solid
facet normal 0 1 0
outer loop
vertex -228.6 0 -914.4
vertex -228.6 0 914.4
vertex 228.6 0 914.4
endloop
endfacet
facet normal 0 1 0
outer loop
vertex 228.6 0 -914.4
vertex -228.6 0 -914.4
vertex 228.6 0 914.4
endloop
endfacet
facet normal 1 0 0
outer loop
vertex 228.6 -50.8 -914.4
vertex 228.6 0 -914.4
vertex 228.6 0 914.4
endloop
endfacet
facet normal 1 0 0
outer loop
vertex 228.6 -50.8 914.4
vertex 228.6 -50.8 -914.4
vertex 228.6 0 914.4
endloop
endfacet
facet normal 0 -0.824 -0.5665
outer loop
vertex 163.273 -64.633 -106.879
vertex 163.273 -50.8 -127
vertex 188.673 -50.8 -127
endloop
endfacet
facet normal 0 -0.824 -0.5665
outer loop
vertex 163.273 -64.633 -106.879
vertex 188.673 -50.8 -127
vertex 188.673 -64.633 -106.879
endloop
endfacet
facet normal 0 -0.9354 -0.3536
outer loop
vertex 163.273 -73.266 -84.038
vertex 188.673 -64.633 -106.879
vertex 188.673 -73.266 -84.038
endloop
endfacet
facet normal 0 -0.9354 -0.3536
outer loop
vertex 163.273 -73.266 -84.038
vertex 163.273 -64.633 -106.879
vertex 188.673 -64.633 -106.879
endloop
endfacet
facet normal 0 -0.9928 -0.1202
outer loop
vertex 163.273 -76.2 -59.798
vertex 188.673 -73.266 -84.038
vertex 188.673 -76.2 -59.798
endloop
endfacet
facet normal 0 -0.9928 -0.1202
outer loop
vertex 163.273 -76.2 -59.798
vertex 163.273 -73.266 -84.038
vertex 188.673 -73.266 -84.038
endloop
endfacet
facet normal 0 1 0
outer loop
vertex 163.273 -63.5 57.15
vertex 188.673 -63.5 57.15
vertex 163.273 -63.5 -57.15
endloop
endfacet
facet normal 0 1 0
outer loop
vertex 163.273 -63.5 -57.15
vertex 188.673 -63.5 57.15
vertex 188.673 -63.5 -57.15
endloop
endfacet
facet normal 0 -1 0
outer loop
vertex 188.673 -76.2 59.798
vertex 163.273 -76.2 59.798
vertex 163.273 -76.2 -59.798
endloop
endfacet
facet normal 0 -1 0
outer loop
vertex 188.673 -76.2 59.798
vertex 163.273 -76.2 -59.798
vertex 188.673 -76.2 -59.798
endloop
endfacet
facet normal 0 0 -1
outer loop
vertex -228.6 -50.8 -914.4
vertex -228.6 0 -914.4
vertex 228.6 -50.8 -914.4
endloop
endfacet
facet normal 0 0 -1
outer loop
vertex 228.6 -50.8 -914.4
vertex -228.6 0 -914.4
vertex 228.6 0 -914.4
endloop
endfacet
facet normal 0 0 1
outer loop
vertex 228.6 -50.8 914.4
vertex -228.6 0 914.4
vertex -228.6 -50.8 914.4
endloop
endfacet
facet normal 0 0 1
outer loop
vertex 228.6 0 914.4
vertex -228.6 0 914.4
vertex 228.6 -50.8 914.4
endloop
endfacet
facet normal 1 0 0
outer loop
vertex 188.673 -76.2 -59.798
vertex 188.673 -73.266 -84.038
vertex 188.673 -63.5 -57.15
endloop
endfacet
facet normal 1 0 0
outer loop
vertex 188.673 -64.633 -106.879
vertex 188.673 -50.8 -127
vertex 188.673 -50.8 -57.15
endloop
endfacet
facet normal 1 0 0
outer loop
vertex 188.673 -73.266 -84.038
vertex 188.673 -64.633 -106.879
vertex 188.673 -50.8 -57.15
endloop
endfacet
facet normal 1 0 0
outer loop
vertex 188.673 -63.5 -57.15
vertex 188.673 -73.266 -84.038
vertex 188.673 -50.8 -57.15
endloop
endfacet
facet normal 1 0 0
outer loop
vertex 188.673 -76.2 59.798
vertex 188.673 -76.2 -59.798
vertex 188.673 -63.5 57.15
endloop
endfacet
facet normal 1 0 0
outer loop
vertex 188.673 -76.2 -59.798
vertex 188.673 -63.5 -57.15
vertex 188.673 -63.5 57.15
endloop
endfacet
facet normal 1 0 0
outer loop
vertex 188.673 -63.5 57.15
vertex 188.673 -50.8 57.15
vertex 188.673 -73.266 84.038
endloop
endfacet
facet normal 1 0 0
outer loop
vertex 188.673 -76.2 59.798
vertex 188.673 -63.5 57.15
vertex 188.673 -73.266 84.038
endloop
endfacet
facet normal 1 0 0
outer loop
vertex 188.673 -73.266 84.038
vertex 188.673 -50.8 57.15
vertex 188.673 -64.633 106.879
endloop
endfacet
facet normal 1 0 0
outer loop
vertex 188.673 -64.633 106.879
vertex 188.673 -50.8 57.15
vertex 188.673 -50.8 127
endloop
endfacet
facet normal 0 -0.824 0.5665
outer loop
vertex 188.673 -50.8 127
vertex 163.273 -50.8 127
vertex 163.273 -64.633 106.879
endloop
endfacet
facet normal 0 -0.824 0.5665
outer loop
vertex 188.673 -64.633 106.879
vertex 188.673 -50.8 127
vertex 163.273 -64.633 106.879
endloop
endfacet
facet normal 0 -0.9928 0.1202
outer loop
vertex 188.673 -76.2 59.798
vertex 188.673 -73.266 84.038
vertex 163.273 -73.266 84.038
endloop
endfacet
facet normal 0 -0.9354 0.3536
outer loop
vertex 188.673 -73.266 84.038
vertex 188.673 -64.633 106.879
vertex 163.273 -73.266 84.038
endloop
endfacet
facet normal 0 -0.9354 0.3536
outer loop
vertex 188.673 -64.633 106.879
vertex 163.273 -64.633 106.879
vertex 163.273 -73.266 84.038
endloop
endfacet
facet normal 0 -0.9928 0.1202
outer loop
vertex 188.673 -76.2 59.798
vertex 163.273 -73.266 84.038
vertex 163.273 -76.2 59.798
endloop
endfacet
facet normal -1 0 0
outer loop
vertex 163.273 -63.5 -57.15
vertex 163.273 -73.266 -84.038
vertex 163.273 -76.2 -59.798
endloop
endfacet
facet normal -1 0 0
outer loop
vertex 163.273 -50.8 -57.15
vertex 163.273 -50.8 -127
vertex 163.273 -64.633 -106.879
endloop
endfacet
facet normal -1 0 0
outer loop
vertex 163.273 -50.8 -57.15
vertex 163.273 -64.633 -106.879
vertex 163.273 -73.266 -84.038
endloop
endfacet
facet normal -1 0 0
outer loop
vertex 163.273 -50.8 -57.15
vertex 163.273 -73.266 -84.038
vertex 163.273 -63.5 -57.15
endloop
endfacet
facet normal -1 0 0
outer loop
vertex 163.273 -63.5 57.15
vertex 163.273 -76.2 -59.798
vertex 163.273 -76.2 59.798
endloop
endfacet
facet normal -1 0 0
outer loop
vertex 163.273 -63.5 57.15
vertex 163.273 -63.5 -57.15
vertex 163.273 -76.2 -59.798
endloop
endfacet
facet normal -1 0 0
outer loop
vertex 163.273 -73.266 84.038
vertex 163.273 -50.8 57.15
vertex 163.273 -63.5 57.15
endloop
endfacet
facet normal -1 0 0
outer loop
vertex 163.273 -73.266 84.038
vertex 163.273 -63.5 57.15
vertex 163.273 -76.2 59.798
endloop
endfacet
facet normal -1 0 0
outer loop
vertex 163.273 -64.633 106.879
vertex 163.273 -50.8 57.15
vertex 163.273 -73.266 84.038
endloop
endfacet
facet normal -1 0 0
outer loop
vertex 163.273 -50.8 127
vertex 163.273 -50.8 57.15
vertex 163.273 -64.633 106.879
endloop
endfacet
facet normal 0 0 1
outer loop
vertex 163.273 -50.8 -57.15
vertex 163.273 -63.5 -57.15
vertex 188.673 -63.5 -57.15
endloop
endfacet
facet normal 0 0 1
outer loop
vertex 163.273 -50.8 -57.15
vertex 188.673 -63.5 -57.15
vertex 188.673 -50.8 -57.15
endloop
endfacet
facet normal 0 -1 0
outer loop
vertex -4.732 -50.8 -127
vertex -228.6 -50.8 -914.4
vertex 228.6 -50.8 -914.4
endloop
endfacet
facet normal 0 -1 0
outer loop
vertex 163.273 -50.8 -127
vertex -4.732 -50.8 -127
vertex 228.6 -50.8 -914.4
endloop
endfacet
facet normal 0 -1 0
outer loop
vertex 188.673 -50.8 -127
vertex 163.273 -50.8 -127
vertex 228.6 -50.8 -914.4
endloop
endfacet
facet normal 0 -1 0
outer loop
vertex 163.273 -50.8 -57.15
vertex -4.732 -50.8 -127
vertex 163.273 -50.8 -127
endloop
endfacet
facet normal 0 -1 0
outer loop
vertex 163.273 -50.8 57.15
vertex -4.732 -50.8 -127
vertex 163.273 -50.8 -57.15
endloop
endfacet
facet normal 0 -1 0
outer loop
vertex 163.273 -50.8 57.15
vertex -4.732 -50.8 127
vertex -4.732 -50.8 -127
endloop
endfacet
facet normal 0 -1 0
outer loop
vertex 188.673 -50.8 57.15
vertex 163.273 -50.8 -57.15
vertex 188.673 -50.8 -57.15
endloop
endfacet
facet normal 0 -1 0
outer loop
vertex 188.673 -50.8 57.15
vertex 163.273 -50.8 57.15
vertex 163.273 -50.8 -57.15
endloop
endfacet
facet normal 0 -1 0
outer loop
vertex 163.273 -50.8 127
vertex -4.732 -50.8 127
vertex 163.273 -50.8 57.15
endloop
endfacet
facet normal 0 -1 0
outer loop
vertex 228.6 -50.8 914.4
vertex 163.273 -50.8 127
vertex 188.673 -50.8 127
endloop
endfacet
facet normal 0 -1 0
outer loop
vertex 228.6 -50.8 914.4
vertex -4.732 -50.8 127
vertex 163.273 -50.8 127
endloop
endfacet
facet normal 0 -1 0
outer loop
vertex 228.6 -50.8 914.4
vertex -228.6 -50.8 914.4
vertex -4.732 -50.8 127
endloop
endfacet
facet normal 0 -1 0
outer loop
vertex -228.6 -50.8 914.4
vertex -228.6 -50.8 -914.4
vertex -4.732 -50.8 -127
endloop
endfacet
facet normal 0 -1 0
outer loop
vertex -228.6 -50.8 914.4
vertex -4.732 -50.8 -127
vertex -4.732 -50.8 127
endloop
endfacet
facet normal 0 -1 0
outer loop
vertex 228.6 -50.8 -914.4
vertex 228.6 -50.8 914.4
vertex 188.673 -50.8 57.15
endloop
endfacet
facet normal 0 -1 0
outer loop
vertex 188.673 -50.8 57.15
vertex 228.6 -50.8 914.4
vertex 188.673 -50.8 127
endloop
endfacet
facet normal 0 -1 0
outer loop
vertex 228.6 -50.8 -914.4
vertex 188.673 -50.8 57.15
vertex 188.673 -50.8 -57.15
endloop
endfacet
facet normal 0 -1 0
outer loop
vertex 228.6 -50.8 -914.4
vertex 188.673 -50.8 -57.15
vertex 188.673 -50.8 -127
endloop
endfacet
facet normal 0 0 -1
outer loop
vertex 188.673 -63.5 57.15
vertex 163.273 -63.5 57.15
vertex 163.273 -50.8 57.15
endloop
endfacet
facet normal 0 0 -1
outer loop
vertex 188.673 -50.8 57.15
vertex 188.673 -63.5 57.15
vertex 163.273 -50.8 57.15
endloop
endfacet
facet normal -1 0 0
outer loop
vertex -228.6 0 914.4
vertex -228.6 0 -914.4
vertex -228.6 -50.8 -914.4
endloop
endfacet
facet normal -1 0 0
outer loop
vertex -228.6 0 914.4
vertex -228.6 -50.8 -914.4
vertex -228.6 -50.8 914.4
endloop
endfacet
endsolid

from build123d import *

# Parameters (mm, degrees)
F0_W        = 457.2
F0_H        = 1828.8
F1_DEPTH    = 50.8
F2_W        = 25.4
F2_H        = 254
F3_DEPTH    = 25.4
F4_T1_DEPTH = 361.4104165052
F5_W        = 12.7
F5_H        = 57.15
F6_DEPTH    = 417.2741922717


# Not quite as in the source:
# - a fillet or chamfer that OpenCascade refuses, or shapes differently, is made with other operations: its cross-section is extruded or revolved along the edge and cut away or added


with BuildPart() as f1:
    # F0 (on Front) → F1 (new body)
    with BuildSketch(Plane.XZ):
        Rectangle(F0_W, F0_H)
    extrude(amount=F1_DEPTH)

    # F2 (on face) → F3 (join)
    with BuildSketch(Plane.XZ.offset(50.8)):
        with Locations((175.9731922717, 0)):
            Rectangle(F2_W, F2_H)
    extrude(amount=F3_DEPTH)

    # F4: fillet of radius 101.6 on 2 edges, made by hand

    # F4_s2 → F4_t1 (cut)
    with BuildSketch(Plane.YZ.offset(-4.7320159809)):
        with BuildLine():
            ThreePointArc((-50.8, 127), (-69.6380976241, 95.7189411832), (-76.2, 59.797916699))
            Line((-76.2, 59.797916699), (-76.2, 127))
            Line((-76.2, 127), (-50.8, 127))
        make_face()
        with BuildLine():
            ThreePointArc((-50.8, -127), (-69.6380976241, -95.7189411832), (-76.2, -59.797916699))
            Line((-76.2, -59.797916699), (-76.2, -127))
            Line((-76.2, -127), (-50.8, -127))
        make_face()
    extrude(amount=F4_T1_DEPTH, mode=Mode.SUBTRACT)

    # F5 (on face) → F6 (cut, through all)
    with BuildSketch(Plane.YZ.offset(188.6731922717)):
        with Locations((-57.15, -28.575)):
            Rectangle(F5_W, F5_H)
        with Locations((-57.15, 28.575)):
            Rectangle(F5_W, F5_H)
    extrude(amount=-F6_DEPTH, mode=Mode.SUBTRACT)


solid = f1.part
